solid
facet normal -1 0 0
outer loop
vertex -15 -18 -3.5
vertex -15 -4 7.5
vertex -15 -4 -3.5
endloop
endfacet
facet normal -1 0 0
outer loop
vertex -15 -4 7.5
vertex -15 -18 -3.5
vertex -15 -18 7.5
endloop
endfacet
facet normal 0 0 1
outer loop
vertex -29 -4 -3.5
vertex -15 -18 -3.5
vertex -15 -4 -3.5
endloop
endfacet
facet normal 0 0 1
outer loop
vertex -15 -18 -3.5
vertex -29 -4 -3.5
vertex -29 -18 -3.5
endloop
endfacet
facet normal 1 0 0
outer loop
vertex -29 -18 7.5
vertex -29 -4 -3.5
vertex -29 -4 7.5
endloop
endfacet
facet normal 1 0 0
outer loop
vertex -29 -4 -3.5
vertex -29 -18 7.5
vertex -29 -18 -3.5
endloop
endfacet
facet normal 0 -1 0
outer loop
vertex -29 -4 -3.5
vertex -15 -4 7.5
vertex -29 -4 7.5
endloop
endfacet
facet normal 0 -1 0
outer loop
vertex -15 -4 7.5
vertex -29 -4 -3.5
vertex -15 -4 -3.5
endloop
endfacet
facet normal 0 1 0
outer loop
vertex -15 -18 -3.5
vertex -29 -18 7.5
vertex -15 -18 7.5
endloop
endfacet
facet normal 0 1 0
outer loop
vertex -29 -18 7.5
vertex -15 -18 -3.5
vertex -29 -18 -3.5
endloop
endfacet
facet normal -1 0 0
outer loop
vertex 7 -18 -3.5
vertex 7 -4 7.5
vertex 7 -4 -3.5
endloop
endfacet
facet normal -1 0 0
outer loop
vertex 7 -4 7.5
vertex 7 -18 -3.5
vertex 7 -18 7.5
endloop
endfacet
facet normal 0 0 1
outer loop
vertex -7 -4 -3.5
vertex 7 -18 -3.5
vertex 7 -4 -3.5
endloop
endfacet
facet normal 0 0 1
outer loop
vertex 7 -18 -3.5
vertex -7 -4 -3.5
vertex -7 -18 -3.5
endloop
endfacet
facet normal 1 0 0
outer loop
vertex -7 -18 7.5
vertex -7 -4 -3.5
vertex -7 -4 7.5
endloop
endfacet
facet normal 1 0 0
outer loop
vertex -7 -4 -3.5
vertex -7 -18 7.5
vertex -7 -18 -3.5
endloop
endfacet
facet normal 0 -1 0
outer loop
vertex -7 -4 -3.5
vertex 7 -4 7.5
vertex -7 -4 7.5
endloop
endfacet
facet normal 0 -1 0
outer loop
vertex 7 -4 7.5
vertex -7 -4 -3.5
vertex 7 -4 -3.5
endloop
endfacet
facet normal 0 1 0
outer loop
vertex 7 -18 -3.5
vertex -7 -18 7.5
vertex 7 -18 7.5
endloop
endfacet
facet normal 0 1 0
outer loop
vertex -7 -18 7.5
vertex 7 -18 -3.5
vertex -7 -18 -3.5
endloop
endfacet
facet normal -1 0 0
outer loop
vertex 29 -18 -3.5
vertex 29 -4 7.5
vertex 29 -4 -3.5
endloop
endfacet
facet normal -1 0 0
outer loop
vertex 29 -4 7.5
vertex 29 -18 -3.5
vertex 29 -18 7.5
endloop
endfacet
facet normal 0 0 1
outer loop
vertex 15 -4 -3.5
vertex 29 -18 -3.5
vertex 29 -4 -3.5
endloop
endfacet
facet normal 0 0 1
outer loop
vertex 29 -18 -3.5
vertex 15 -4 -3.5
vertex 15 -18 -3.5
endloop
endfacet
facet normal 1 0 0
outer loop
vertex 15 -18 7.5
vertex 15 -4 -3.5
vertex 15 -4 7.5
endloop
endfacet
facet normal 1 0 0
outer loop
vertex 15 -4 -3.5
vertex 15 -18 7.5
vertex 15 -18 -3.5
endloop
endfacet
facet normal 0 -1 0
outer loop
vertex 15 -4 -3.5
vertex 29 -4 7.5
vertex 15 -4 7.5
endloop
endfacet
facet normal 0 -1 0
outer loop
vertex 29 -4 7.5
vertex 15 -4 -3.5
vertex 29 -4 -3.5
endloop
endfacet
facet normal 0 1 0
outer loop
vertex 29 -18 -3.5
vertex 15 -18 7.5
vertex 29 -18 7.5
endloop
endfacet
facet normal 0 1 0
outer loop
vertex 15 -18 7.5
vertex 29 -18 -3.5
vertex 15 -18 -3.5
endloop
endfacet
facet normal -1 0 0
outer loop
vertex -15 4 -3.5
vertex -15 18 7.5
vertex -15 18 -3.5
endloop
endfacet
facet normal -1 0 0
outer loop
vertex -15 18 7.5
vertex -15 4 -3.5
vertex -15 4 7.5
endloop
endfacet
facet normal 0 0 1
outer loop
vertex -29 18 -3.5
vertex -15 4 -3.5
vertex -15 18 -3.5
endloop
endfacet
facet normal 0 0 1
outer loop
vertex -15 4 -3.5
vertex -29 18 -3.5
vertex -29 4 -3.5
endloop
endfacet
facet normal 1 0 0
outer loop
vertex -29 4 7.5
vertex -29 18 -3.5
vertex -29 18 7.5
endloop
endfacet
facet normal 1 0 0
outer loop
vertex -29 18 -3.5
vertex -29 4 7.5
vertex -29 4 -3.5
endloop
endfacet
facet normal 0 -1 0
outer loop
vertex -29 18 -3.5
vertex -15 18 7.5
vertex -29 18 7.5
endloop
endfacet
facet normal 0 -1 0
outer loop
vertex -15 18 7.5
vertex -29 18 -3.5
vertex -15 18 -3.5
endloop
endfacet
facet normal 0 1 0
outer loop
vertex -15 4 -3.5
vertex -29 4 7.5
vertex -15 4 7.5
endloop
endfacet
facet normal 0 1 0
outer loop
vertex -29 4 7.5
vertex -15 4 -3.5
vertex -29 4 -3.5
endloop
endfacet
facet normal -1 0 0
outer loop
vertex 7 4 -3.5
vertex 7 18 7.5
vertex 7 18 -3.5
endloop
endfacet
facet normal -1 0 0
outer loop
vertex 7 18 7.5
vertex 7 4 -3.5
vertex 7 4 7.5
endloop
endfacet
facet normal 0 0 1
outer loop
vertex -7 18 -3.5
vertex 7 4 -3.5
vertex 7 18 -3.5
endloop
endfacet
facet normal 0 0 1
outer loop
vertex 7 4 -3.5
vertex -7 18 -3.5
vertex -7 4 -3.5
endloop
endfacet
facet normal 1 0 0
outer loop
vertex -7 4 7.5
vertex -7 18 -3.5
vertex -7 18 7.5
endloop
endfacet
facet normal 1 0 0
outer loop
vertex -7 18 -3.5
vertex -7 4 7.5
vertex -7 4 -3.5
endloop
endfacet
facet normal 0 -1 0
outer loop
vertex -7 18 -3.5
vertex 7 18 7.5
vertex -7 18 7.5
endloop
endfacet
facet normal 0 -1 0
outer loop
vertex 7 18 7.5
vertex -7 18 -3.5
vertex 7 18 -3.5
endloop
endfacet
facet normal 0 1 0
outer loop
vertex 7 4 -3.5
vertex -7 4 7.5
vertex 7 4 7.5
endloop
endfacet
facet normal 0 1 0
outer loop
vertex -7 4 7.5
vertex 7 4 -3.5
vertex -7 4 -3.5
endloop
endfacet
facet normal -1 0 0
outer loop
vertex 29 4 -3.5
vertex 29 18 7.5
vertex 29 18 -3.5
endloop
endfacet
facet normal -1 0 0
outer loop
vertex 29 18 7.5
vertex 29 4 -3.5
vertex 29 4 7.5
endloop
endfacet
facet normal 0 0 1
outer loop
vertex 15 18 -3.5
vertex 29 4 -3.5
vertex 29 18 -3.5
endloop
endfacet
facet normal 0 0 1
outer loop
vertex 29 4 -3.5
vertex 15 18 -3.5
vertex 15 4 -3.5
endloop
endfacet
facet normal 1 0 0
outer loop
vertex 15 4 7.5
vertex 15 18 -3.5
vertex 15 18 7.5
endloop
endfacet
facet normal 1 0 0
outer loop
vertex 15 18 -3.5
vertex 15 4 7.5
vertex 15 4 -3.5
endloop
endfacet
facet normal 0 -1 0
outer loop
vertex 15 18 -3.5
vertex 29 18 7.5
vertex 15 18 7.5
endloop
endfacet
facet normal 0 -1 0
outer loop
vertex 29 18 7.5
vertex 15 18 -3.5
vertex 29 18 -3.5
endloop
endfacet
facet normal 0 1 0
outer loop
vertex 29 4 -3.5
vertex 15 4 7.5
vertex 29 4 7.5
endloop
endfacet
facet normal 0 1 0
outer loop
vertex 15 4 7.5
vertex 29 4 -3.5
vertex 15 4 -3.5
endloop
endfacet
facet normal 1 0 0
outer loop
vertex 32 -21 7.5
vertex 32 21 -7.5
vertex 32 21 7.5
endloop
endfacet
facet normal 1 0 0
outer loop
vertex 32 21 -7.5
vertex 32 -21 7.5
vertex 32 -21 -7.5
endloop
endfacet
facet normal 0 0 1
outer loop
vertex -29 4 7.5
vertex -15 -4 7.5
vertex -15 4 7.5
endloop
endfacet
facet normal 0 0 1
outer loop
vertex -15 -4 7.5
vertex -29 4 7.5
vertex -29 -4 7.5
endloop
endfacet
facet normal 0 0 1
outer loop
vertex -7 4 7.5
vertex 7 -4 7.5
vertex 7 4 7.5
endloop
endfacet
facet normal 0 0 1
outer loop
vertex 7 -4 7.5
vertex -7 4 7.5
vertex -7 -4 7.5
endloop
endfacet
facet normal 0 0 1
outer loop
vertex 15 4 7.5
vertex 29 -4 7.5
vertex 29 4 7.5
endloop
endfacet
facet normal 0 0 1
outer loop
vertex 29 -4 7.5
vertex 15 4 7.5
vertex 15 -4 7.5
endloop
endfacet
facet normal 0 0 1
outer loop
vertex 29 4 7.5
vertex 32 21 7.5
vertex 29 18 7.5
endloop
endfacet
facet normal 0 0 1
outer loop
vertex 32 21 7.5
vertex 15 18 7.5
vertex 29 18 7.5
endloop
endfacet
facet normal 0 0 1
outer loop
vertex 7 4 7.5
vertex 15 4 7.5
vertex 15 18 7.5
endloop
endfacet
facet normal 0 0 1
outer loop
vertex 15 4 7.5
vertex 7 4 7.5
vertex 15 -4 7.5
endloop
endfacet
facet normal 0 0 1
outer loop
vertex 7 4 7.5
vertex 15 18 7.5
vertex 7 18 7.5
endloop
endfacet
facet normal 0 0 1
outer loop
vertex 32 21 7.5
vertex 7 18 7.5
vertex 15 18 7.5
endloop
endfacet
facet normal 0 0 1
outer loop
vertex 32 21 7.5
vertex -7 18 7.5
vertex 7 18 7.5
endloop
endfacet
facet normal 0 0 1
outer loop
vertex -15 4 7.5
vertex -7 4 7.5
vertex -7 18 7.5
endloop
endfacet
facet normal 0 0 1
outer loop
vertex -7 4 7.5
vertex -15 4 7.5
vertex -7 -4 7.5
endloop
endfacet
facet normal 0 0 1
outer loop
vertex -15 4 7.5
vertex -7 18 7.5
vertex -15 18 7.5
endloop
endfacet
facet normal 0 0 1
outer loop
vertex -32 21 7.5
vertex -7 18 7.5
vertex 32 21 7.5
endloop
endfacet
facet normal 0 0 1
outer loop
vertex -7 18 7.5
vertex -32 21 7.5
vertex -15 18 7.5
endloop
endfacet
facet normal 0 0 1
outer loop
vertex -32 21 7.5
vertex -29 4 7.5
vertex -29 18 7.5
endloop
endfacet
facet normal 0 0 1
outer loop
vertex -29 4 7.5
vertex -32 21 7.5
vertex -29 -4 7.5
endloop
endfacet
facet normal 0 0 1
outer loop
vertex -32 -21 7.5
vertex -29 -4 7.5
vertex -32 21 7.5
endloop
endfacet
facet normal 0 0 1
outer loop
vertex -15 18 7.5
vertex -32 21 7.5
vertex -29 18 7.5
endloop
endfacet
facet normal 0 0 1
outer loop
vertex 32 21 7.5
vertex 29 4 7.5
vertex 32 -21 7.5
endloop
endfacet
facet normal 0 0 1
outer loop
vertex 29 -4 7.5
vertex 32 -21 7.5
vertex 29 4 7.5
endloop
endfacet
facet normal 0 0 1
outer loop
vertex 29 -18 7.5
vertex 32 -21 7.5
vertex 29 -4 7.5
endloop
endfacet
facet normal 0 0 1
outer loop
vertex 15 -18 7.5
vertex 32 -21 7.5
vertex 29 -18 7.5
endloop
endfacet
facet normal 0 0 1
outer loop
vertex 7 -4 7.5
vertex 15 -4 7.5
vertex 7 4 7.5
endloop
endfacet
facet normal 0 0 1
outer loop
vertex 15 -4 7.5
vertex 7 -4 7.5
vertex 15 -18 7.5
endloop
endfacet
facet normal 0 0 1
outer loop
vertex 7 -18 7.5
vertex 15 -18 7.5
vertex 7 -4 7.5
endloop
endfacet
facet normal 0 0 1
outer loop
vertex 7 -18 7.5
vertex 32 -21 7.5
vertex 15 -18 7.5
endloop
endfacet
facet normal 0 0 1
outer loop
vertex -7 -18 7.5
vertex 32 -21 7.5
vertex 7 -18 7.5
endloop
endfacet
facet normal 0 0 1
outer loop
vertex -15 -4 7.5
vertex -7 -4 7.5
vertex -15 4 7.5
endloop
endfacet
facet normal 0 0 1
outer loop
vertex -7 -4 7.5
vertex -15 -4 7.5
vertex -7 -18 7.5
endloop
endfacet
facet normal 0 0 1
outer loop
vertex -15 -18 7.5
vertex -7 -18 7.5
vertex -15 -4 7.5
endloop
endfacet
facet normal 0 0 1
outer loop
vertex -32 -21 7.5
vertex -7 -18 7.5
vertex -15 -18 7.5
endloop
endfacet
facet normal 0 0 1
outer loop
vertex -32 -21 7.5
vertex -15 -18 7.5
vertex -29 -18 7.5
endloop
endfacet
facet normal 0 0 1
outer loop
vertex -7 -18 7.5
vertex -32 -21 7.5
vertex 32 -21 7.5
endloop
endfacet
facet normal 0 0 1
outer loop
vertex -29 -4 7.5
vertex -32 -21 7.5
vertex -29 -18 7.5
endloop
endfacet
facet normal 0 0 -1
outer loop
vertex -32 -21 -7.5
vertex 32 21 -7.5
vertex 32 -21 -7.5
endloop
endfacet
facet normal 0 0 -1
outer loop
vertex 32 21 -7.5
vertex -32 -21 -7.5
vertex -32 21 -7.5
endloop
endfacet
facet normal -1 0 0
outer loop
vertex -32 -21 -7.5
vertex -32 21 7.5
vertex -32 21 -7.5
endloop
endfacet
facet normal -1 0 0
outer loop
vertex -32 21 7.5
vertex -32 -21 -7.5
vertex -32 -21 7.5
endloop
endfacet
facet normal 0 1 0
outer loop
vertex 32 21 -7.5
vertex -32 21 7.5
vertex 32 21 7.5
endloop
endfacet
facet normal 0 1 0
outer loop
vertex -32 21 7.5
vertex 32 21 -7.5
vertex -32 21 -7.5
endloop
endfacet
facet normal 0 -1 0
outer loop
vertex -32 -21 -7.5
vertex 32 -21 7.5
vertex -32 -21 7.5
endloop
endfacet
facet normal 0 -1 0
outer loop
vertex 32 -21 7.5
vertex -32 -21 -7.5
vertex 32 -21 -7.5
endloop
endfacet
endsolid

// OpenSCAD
$fn = 32;

// ----------------------------------------------------------------------
// Pocket plate 64 x 42 x 15
// 2 x 3 pockets 14 mm square, 11 mm deep
// ----------------------------------------------------------------------

// --- parameters (mm) ---
thickness = 15;  // plate thickness
floor_t = 4;     // material left under each pocket
pocket = 14;     // pocket side length
pitch_x = 22;    // pocket pitch along X
pitch_y = 22;    // pocket pitch along Y
cols = 3;        // pockets per row
rows = 2;        // rows of pockets

// --- derived feature positions (mm) ---
depth = thickness - floor_t;        // = 11   pocket depth, down to the floor
span_x = (cols - 1) * pitch_x;      // = 44   distance between outer pockets
span_y = (rows - 1) * pitch_y;      // = 22   distance between outer pocket rows
origin_x = -span_x / 2;             // = -22   X of the first pocket
origin_y = -span_y / 2;             // = -11   Y of the first pocket
plate = [span_x + pocket + 6, span_y + pocket + 6, thickness];  // = [64, 42, 15]   overall size: pockets plus 3 mm of wall on each side
feature_centers = [
  [origin_x + 0 * pitch_x, origin_y + 0 * pitch_y],
  [origin_x + 1 * pitch_x, origin_y + 0 * pitch_y],
  [origin_x + 2 * pitch_x, origin_y + 0 * pitch_y],
  [origin_x + 0 * pitch_x, origin_y + 1 * pitch_y],
  [origin_x + 1 * pitch_x, origin_y + 1 * pitch_y],
  [origin_x + 2 * pitch_x, origin_y + 1 * pitch_y]
];   // pocket centres, used verbatim by the cutter loop

// plate outline, then one pocket per centre in feature_centers
difference() {
  cube(plate, center = true);
  for (centre = feature_centers)
    translate([centre[0] - pocket / 2, centre[1] - pocket / 2, plate[2] / 2 - depth])
      cube([pocket, pocket, depth + 1]);  // centred on the declared pocket centre
}
